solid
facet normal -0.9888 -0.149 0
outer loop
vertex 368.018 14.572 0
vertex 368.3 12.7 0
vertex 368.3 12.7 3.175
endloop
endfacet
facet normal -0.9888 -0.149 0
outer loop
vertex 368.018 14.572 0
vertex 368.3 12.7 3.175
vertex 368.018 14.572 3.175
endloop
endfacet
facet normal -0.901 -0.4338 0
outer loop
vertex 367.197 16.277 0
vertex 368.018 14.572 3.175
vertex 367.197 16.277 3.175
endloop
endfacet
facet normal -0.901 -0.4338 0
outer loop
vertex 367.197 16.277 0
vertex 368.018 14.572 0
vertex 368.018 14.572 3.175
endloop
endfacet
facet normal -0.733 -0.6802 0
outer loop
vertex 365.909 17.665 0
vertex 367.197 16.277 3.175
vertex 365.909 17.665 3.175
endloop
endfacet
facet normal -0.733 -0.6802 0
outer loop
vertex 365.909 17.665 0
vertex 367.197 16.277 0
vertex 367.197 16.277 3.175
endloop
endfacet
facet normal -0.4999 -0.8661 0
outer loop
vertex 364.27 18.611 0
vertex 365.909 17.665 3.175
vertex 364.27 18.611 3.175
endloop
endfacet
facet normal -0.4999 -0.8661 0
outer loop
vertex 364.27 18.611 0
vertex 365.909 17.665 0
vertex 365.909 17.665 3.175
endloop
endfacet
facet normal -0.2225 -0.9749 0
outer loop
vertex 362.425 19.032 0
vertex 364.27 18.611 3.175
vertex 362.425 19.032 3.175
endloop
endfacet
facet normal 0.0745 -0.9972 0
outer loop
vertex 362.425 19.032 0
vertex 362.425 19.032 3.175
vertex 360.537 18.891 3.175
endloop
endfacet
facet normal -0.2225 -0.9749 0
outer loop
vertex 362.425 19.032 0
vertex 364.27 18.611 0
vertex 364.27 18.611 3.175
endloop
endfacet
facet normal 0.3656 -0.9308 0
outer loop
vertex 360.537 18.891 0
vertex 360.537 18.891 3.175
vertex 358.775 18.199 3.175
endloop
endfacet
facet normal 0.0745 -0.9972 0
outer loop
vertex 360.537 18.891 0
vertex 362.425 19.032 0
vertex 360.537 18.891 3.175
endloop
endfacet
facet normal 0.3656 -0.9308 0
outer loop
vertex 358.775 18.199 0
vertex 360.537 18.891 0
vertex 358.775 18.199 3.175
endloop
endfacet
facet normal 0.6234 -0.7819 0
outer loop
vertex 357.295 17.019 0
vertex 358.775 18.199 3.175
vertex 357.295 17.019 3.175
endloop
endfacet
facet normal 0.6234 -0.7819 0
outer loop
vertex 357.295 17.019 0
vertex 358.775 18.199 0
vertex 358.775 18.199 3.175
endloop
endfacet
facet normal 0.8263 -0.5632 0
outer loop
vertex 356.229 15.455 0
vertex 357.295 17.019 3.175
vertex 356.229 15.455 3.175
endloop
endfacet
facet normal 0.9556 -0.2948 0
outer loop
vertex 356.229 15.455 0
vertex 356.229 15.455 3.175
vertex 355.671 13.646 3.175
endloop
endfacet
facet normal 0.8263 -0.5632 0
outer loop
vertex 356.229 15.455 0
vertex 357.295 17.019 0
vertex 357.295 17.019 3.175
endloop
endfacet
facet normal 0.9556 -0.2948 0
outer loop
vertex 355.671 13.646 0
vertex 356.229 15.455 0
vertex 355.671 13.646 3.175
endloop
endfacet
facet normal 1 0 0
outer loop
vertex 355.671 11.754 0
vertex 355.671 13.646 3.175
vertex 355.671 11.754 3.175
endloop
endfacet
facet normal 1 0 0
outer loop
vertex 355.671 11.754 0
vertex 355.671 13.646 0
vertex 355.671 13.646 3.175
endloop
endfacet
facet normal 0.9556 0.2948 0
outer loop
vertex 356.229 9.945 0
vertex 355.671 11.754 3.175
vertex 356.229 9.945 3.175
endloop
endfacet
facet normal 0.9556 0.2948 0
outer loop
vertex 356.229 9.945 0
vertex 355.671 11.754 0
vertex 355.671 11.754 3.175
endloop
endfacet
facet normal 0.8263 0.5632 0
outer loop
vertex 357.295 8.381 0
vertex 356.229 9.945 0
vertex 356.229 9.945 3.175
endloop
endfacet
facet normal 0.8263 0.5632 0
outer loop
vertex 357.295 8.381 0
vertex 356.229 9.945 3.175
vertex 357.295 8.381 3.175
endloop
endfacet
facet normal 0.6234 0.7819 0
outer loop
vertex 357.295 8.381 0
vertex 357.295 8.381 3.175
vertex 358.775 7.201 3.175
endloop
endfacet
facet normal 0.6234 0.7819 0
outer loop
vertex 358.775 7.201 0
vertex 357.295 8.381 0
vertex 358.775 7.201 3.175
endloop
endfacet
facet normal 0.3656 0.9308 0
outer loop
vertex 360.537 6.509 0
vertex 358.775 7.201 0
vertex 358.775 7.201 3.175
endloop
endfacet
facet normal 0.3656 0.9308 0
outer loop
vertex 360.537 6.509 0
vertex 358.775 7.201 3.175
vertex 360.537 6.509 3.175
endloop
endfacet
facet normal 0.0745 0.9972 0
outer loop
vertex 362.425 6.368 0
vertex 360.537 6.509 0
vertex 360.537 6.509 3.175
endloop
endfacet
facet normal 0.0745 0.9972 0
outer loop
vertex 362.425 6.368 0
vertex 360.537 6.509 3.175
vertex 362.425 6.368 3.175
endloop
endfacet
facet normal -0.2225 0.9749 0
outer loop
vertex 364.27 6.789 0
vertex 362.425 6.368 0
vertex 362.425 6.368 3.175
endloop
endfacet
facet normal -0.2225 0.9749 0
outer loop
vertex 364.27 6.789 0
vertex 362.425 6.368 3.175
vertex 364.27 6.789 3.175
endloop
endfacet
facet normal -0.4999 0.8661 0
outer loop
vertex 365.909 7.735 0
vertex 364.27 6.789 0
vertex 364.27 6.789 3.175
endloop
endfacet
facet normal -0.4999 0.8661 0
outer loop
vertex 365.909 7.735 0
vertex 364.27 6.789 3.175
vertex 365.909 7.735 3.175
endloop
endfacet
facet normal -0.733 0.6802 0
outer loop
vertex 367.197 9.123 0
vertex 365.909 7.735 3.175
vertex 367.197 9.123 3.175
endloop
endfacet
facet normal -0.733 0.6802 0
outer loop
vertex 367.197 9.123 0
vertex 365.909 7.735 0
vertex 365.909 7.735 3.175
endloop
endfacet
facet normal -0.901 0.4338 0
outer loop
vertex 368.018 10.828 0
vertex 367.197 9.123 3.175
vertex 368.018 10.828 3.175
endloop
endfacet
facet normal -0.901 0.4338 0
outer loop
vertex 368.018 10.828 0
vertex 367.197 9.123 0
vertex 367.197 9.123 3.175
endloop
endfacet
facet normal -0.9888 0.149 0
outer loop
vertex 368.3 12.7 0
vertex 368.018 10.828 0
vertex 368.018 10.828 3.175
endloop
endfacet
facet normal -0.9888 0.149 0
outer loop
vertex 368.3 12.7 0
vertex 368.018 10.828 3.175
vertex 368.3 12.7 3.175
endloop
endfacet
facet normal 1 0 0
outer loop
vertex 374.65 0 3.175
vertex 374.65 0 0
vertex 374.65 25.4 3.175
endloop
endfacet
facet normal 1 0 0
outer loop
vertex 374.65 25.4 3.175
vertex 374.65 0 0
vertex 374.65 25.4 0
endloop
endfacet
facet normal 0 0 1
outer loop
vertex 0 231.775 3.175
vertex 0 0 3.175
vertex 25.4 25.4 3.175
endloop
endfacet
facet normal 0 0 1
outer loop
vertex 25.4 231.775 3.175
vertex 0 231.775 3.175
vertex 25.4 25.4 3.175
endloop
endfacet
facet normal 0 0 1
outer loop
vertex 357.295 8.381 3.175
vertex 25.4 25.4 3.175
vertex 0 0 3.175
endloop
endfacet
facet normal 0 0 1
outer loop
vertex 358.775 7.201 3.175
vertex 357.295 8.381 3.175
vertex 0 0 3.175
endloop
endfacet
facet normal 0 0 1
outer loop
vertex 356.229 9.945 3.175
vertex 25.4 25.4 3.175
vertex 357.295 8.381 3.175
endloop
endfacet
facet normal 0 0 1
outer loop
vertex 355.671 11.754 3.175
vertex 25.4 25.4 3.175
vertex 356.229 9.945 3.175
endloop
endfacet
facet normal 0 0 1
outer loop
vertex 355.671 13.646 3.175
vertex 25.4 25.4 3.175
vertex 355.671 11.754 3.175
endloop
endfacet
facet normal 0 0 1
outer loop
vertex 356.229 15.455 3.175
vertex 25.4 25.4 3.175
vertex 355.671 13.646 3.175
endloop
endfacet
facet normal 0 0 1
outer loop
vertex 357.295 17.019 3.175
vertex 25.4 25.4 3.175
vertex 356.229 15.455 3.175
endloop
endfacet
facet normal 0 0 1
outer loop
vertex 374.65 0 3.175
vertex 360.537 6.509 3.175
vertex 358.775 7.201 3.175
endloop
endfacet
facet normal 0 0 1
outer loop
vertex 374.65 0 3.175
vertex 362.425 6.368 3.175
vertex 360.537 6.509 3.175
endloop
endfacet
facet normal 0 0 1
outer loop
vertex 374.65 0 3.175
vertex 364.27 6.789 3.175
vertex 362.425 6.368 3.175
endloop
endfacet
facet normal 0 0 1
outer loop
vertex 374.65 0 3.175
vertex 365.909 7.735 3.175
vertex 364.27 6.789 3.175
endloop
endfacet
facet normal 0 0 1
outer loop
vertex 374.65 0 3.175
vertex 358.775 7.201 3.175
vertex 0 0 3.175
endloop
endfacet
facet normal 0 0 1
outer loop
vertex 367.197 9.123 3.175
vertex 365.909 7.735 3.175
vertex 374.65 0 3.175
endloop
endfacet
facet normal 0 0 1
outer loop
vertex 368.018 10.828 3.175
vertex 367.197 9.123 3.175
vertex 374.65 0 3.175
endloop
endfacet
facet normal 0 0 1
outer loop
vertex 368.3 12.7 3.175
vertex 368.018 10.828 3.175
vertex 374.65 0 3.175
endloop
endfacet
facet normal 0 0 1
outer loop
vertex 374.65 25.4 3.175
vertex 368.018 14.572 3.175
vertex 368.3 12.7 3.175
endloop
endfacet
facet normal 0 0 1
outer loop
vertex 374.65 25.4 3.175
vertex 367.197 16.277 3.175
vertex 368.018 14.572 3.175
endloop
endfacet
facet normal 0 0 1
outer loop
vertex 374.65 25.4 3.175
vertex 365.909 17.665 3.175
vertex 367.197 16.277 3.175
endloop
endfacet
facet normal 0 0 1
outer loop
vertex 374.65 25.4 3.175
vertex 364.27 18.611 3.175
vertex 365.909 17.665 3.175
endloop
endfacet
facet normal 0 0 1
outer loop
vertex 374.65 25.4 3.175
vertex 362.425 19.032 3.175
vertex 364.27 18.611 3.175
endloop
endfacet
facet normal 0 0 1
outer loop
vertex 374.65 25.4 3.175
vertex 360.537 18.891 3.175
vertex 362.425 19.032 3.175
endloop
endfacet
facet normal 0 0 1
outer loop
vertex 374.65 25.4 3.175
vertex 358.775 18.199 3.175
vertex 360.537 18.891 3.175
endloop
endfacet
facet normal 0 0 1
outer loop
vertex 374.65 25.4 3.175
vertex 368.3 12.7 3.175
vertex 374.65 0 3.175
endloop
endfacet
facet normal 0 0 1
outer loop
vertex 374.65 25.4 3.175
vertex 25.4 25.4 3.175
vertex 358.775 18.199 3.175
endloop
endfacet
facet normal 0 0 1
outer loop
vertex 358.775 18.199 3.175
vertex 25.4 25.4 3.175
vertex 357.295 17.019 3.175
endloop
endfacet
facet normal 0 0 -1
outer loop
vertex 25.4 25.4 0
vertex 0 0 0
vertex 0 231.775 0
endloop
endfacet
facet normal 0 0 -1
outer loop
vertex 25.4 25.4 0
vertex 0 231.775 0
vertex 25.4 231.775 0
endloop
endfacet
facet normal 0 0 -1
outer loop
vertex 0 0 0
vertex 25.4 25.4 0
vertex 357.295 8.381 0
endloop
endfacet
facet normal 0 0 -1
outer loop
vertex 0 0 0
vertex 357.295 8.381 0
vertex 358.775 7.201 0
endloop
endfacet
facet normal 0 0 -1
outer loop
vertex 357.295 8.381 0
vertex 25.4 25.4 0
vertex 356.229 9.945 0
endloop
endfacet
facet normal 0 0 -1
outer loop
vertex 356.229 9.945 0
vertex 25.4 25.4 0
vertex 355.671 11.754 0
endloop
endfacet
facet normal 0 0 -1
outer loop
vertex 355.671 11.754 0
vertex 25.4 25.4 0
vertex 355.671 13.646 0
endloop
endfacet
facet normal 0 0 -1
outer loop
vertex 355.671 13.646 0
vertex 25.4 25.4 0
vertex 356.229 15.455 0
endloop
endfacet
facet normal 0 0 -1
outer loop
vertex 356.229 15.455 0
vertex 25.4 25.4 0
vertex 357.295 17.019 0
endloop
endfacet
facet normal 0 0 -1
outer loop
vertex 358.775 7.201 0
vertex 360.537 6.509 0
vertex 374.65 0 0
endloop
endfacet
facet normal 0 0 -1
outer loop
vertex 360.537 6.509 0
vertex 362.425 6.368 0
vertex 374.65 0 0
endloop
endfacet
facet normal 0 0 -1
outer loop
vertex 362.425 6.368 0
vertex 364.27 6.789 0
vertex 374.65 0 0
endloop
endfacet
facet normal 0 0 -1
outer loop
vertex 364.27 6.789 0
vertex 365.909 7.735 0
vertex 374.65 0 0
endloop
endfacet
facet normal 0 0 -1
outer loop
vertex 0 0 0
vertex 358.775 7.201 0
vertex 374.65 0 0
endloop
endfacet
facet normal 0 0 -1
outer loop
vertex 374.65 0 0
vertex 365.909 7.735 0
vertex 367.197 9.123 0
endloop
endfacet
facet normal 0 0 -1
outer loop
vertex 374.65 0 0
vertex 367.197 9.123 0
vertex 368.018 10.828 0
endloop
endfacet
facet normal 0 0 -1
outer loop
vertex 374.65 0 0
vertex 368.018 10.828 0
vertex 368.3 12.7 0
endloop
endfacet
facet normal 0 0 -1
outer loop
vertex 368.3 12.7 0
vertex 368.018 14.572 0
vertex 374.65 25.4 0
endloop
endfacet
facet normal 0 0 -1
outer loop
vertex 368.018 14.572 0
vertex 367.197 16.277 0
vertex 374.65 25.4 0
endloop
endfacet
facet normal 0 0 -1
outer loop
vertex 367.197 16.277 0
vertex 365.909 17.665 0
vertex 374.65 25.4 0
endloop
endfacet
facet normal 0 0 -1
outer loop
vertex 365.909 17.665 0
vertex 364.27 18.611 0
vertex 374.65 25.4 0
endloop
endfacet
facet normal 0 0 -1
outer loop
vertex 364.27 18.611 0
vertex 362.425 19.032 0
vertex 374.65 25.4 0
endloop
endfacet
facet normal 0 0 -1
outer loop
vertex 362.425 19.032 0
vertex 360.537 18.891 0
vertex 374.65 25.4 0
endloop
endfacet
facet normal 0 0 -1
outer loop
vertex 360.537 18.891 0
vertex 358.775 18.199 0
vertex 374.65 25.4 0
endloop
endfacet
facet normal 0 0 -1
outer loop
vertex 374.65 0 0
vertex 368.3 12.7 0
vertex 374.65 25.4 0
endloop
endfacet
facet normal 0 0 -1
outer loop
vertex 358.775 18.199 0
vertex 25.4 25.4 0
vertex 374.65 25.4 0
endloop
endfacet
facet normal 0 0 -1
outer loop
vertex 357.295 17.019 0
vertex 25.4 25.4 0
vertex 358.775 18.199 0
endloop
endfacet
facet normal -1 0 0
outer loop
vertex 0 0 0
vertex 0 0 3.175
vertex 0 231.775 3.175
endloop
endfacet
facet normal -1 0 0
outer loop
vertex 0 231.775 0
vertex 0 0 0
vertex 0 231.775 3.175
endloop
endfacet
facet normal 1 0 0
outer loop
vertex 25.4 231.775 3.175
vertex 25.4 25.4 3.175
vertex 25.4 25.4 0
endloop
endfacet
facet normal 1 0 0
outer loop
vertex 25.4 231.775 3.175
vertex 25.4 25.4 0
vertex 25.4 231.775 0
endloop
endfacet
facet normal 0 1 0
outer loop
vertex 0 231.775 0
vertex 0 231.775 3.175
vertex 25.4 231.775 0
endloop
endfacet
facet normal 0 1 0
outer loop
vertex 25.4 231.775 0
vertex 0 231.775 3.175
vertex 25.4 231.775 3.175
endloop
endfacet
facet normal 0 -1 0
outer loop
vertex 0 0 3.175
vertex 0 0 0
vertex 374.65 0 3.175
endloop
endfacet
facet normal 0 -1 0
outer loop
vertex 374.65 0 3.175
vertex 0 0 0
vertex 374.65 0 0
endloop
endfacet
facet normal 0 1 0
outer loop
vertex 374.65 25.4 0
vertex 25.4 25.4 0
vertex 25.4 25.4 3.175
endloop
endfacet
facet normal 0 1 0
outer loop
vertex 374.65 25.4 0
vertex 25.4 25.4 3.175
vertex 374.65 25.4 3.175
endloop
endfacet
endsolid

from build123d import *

# Parameters (mm, degrees)
SKETCH1_W           = 374.65
SKETCH1_H           = 25.4
SKETCH1_R           = 6.35
BOSS_EXTRUDE1_DEPTH = 3.175
SKETCH2_W           = 25.4
SKETCH2_H           = 206.375
BOSS_EXTRUDE2_DEPTH = 3.175


with BuildPart() as part:
    # Sketch1 → Boss-Extrude1 (new body)
    with BuildSketch(Plane.XY):
        with Locations((187.325, 12.7)):
            Rectangle(SKETCH1_W, SKETCH1_H)
        with Locations((361.95, 12.7)):
            Circle(SKETCH1_R, mode=Mode.SUBTRACT)
    extrude(amount=BOSS_EXTRUDE1_DEPTH)

    # Sketch2 → Boss-Extrude2 (add)
    with BuildSketch(Plane.XY.offset(3.175)):
        with Locations((12.7, 128.5875)):
            Rectangle(SKETCH2_W, SKETCH2_H)
    extrude(amount=-BOSS_EXTRUDE2_DEPTH)


solid = part.part
